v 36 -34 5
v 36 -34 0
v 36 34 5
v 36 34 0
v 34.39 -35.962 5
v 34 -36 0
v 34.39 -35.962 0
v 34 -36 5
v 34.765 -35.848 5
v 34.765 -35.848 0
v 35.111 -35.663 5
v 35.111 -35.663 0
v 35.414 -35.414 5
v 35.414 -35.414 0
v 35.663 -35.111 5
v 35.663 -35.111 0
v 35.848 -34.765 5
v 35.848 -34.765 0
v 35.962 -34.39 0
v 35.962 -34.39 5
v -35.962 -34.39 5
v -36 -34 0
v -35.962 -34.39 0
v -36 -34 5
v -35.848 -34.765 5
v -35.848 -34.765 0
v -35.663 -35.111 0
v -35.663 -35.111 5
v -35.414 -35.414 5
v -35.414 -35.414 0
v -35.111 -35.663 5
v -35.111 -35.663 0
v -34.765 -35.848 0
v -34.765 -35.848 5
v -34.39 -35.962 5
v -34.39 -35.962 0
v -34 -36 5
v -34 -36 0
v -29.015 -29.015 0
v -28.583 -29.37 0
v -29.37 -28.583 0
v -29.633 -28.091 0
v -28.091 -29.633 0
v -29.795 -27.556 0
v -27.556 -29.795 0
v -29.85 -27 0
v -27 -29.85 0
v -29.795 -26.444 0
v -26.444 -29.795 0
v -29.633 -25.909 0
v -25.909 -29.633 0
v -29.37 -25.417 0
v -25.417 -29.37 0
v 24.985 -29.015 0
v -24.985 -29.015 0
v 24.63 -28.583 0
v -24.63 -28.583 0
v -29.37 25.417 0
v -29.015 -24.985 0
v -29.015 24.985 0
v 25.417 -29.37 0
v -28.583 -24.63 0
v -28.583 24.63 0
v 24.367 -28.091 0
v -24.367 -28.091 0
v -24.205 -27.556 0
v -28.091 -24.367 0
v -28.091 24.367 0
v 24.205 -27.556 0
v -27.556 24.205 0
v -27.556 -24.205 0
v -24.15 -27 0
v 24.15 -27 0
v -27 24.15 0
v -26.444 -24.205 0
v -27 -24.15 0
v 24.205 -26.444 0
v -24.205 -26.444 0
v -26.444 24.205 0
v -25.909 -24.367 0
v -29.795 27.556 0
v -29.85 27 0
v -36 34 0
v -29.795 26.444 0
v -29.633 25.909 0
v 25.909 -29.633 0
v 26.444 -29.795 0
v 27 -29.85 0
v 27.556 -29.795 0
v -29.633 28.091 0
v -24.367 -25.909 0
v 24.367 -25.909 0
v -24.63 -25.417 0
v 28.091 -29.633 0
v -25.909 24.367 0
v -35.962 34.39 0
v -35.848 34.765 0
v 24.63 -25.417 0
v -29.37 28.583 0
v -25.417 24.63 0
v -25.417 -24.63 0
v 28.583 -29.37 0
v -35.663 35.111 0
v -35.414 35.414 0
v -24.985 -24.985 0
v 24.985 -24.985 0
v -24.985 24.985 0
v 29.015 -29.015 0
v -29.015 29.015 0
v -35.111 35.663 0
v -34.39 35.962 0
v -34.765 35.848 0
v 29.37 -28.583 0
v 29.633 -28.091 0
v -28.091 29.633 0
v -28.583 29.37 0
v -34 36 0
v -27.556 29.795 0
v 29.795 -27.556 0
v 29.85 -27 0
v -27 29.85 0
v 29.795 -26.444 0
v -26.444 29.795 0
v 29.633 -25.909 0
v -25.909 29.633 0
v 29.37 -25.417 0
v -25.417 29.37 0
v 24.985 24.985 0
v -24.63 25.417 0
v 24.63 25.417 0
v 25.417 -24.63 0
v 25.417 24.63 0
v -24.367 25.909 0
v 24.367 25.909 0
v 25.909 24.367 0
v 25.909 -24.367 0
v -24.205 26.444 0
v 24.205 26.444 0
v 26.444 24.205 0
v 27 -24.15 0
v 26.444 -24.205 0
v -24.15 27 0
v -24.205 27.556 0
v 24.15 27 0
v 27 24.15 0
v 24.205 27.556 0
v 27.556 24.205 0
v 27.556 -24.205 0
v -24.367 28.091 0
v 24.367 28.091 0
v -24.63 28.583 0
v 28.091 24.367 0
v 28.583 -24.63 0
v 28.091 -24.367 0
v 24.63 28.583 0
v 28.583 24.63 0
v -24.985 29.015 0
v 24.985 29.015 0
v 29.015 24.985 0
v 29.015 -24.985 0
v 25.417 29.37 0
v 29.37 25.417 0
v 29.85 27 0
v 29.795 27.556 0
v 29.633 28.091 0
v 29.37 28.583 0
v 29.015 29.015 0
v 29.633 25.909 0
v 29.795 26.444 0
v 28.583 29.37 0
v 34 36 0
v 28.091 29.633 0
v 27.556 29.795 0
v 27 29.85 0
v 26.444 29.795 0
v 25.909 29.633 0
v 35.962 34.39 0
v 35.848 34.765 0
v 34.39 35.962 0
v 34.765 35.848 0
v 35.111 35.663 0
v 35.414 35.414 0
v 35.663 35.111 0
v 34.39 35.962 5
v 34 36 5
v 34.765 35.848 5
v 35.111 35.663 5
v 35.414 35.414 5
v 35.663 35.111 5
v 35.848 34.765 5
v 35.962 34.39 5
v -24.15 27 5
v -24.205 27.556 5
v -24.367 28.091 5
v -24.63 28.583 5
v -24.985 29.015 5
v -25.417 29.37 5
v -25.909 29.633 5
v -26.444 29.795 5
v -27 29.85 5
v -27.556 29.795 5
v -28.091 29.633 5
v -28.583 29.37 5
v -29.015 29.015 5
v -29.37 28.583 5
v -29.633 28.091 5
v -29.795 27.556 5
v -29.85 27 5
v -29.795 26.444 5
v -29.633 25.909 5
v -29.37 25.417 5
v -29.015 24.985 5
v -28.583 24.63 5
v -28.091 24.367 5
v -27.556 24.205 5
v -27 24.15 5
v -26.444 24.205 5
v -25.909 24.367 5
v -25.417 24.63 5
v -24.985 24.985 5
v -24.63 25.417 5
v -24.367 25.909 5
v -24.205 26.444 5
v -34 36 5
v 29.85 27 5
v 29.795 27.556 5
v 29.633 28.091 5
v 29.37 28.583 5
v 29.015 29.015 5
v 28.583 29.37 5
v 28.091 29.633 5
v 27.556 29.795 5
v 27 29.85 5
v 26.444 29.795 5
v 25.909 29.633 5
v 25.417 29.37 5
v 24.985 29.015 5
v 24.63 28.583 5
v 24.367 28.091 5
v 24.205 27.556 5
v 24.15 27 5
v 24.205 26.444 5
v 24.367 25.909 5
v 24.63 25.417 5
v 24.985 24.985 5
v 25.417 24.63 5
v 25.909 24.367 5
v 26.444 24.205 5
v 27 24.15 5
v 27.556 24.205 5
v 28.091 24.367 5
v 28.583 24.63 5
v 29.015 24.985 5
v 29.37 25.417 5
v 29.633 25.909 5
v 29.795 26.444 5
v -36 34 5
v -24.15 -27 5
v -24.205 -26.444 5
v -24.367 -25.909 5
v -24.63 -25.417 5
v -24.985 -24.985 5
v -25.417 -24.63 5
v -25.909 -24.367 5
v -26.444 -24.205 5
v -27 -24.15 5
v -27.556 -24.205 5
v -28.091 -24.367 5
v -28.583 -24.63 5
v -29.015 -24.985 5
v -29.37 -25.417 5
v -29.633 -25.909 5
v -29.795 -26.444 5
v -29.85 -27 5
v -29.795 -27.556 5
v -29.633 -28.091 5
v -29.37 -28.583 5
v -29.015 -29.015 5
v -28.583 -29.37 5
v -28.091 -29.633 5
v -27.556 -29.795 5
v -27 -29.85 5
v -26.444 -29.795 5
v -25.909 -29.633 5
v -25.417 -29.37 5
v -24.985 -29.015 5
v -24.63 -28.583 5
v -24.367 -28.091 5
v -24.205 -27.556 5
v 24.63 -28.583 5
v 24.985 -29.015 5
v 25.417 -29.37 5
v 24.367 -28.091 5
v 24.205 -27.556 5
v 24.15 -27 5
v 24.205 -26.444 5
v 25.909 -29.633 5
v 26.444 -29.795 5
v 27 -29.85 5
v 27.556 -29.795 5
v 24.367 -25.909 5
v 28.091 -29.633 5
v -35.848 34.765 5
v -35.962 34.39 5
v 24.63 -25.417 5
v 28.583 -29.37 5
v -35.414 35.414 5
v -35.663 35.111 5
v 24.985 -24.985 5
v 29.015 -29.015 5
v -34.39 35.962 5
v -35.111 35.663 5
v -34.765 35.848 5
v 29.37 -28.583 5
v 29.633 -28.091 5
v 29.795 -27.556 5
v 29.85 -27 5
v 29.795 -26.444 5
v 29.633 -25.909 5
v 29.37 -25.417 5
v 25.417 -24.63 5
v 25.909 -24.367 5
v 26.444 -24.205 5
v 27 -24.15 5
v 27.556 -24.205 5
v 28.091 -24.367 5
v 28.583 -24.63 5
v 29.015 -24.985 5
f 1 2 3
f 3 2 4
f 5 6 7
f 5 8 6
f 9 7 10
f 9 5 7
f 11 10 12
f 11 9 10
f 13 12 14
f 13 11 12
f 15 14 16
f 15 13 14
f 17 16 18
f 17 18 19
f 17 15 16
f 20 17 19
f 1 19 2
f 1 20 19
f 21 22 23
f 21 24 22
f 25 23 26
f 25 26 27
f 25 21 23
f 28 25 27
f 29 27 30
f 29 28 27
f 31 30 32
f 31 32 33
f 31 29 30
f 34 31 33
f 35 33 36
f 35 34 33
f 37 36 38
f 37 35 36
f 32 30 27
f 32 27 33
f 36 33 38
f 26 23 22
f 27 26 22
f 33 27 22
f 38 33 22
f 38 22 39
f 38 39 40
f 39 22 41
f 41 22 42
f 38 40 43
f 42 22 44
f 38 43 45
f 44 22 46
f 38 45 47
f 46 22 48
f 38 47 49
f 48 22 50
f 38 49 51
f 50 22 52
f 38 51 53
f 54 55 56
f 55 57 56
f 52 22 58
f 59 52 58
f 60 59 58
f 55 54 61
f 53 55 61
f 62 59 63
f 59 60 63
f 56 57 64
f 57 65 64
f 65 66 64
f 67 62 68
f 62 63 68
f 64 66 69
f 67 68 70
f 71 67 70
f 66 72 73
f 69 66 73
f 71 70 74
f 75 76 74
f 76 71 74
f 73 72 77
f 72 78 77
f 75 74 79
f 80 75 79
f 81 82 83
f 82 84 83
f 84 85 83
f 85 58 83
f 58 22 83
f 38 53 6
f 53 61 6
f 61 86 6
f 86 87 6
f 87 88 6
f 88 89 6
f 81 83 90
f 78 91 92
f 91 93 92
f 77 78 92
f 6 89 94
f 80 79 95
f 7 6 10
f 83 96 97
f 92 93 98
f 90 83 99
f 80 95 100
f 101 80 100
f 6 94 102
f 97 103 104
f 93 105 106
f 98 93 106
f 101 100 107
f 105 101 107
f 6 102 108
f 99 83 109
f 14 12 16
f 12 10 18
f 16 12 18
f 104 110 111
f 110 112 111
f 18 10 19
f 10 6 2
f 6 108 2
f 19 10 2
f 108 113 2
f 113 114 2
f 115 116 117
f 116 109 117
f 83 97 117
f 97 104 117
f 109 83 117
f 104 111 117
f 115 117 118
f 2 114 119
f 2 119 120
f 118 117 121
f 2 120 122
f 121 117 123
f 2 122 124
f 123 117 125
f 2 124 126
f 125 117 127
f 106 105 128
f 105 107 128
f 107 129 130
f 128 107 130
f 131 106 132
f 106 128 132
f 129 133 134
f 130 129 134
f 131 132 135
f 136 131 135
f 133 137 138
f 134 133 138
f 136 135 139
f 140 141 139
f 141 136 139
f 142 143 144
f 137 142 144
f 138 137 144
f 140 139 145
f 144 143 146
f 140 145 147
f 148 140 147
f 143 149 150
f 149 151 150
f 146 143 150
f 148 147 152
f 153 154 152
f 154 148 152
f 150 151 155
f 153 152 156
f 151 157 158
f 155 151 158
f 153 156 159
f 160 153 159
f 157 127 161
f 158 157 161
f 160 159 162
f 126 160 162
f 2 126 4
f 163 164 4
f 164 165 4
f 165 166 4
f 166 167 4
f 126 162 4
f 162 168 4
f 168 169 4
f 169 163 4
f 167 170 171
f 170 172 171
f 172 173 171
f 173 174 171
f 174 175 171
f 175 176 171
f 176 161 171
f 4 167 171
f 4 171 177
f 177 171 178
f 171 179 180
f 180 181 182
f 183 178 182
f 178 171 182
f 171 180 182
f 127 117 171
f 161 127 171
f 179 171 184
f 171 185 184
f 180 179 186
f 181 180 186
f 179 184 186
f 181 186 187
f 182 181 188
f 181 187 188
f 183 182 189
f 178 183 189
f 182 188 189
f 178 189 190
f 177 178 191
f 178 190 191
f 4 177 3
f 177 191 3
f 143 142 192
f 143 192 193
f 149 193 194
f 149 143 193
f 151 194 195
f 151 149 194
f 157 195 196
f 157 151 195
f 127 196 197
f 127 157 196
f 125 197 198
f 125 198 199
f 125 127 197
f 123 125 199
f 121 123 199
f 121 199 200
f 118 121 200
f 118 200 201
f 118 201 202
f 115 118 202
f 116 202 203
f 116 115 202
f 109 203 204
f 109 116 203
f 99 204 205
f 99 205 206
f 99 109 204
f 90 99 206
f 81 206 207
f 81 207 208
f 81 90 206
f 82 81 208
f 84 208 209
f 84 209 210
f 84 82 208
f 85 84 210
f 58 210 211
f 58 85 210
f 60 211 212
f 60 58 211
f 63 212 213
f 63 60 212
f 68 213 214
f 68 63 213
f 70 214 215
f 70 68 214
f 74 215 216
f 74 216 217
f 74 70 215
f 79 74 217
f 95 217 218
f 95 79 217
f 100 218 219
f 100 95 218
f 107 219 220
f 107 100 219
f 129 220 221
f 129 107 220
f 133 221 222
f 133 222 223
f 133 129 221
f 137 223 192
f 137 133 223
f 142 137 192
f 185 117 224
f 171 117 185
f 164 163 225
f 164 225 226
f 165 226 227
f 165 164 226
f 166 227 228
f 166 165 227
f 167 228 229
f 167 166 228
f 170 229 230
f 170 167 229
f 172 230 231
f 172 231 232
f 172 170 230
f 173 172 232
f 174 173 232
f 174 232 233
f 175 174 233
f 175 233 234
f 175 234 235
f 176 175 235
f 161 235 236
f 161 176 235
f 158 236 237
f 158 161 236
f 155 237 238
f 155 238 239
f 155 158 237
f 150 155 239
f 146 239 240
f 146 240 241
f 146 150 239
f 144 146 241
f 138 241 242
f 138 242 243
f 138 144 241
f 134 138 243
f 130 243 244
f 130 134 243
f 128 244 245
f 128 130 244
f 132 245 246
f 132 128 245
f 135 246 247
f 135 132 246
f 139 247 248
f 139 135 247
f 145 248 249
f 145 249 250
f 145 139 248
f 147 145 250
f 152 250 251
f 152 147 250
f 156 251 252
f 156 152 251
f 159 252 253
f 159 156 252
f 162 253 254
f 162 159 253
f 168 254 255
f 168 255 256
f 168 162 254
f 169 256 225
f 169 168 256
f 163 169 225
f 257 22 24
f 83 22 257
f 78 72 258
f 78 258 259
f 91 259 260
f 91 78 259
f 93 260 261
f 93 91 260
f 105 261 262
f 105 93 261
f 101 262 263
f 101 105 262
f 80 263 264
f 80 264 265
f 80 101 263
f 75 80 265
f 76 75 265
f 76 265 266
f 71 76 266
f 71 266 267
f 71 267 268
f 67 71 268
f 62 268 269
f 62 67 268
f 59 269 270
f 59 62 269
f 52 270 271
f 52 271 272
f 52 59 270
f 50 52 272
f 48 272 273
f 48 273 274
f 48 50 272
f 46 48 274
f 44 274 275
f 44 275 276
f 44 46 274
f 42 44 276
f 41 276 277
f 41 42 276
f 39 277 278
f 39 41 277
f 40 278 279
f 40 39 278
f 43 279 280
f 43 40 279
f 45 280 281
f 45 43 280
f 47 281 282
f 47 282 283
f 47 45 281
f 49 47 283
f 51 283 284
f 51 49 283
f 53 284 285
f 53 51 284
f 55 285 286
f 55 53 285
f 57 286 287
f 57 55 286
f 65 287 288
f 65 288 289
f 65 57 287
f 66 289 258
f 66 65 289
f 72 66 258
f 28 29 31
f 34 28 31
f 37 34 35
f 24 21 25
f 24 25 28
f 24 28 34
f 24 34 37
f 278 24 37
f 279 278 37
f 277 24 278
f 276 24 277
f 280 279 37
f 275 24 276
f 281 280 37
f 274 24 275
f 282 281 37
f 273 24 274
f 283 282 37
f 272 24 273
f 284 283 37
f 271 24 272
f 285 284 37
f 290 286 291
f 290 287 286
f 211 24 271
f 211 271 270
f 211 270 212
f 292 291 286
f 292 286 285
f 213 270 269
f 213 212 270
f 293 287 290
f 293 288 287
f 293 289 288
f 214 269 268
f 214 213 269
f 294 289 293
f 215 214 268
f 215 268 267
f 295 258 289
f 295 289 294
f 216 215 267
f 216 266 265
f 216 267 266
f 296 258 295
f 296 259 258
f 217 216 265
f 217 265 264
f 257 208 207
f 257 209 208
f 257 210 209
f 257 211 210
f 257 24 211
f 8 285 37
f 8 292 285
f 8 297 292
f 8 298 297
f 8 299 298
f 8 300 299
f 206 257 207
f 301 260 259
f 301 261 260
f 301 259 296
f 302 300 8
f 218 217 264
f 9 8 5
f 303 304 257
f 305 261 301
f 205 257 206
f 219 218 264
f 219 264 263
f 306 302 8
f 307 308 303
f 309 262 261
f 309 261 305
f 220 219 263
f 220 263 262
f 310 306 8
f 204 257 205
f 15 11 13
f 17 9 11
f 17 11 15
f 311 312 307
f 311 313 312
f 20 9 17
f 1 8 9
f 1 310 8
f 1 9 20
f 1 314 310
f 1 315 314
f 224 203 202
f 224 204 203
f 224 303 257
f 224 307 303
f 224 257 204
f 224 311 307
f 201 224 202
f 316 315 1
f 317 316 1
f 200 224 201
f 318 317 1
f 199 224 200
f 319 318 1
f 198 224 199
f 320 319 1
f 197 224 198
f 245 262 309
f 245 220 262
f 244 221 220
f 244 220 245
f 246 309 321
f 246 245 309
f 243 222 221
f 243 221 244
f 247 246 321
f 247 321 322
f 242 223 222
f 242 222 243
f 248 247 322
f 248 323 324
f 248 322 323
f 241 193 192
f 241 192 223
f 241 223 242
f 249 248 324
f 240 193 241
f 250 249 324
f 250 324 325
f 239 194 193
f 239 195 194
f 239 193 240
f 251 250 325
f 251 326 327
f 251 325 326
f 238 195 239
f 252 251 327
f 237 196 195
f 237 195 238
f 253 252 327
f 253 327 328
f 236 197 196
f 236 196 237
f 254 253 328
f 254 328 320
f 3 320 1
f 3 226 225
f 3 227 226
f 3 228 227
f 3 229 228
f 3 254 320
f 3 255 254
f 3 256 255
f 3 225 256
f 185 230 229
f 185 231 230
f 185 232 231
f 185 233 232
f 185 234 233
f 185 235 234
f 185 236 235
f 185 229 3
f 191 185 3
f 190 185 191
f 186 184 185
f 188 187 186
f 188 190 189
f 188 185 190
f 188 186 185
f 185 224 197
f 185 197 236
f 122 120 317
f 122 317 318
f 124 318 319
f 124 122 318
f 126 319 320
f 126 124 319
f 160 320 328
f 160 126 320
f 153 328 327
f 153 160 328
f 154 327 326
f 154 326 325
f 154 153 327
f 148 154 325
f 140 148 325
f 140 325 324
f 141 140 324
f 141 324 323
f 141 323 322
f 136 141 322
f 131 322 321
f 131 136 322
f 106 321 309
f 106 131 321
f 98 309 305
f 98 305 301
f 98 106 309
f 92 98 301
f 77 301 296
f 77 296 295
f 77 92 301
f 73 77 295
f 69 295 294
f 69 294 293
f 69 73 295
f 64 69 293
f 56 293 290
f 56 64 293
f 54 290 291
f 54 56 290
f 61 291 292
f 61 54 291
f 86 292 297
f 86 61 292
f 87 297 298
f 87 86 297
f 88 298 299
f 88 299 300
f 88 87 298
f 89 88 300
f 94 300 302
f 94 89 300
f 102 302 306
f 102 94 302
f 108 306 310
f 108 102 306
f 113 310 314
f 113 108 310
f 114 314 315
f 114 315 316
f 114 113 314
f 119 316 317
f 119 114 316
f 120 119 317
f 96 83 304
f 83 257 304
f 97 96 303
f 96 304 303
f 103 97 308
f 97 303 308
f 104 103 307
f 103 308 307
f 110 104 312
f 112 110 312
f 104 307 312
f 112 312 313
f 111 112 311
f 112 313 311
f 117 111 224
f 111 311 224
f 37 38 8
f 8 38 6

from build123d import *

# Parameters (mm, degrees)
SKETCH1_W           = 72
SKETCH1_H           = 72
SKETCH1_R           = 2.85
BOSS_EXTRUDE1_DEPTH = 5
FILLET1_R           = 2
FILLET2_R           = 2


with BuildPart() as part:
    # Sketch1 → Boss-Extrude1 (new body)
    with BuildSketch(Plane.XY):
        Rectangle(SKETCH1_W, SKETCH1_H)
        with Locations((-27, 27)):
            Circle(SKETCH1_R, mode=Mode.SUBTRACT)
        with Locations((27, 27)):
            Circle(SKETCH1_R, mode=Mode.SUBTRACT)
        with Locations((27, -27)):
            Circle(SKETCH1_R, mode=Mode.SUBTRACT)
        with Locations((-27, -27)):
            Circle(SKETCH1_R, mode=Mode.SUBTRACT)
    extrude(amount=BOSS_EXTRUDE1_DEPTH)

    # Fillet1
    fillet1_edges = [part.edges().sort_by_distance(p)[0] for p in [
        (-36, 36, 2.5),
    ]]
    fillet(fillet1_edges, radius=FILLET1_R)

    # Fillet2
    fillet2_edges = [part.edges().sort_by_distance(p)[0] for p in [
        (36, 36, 2.5),
        (36, -36, 2.5),
        (-36, -36, 2.5),
    ]]
    fillet(fillet2_edges, radius=FILLET2_R)


solid = part.part
